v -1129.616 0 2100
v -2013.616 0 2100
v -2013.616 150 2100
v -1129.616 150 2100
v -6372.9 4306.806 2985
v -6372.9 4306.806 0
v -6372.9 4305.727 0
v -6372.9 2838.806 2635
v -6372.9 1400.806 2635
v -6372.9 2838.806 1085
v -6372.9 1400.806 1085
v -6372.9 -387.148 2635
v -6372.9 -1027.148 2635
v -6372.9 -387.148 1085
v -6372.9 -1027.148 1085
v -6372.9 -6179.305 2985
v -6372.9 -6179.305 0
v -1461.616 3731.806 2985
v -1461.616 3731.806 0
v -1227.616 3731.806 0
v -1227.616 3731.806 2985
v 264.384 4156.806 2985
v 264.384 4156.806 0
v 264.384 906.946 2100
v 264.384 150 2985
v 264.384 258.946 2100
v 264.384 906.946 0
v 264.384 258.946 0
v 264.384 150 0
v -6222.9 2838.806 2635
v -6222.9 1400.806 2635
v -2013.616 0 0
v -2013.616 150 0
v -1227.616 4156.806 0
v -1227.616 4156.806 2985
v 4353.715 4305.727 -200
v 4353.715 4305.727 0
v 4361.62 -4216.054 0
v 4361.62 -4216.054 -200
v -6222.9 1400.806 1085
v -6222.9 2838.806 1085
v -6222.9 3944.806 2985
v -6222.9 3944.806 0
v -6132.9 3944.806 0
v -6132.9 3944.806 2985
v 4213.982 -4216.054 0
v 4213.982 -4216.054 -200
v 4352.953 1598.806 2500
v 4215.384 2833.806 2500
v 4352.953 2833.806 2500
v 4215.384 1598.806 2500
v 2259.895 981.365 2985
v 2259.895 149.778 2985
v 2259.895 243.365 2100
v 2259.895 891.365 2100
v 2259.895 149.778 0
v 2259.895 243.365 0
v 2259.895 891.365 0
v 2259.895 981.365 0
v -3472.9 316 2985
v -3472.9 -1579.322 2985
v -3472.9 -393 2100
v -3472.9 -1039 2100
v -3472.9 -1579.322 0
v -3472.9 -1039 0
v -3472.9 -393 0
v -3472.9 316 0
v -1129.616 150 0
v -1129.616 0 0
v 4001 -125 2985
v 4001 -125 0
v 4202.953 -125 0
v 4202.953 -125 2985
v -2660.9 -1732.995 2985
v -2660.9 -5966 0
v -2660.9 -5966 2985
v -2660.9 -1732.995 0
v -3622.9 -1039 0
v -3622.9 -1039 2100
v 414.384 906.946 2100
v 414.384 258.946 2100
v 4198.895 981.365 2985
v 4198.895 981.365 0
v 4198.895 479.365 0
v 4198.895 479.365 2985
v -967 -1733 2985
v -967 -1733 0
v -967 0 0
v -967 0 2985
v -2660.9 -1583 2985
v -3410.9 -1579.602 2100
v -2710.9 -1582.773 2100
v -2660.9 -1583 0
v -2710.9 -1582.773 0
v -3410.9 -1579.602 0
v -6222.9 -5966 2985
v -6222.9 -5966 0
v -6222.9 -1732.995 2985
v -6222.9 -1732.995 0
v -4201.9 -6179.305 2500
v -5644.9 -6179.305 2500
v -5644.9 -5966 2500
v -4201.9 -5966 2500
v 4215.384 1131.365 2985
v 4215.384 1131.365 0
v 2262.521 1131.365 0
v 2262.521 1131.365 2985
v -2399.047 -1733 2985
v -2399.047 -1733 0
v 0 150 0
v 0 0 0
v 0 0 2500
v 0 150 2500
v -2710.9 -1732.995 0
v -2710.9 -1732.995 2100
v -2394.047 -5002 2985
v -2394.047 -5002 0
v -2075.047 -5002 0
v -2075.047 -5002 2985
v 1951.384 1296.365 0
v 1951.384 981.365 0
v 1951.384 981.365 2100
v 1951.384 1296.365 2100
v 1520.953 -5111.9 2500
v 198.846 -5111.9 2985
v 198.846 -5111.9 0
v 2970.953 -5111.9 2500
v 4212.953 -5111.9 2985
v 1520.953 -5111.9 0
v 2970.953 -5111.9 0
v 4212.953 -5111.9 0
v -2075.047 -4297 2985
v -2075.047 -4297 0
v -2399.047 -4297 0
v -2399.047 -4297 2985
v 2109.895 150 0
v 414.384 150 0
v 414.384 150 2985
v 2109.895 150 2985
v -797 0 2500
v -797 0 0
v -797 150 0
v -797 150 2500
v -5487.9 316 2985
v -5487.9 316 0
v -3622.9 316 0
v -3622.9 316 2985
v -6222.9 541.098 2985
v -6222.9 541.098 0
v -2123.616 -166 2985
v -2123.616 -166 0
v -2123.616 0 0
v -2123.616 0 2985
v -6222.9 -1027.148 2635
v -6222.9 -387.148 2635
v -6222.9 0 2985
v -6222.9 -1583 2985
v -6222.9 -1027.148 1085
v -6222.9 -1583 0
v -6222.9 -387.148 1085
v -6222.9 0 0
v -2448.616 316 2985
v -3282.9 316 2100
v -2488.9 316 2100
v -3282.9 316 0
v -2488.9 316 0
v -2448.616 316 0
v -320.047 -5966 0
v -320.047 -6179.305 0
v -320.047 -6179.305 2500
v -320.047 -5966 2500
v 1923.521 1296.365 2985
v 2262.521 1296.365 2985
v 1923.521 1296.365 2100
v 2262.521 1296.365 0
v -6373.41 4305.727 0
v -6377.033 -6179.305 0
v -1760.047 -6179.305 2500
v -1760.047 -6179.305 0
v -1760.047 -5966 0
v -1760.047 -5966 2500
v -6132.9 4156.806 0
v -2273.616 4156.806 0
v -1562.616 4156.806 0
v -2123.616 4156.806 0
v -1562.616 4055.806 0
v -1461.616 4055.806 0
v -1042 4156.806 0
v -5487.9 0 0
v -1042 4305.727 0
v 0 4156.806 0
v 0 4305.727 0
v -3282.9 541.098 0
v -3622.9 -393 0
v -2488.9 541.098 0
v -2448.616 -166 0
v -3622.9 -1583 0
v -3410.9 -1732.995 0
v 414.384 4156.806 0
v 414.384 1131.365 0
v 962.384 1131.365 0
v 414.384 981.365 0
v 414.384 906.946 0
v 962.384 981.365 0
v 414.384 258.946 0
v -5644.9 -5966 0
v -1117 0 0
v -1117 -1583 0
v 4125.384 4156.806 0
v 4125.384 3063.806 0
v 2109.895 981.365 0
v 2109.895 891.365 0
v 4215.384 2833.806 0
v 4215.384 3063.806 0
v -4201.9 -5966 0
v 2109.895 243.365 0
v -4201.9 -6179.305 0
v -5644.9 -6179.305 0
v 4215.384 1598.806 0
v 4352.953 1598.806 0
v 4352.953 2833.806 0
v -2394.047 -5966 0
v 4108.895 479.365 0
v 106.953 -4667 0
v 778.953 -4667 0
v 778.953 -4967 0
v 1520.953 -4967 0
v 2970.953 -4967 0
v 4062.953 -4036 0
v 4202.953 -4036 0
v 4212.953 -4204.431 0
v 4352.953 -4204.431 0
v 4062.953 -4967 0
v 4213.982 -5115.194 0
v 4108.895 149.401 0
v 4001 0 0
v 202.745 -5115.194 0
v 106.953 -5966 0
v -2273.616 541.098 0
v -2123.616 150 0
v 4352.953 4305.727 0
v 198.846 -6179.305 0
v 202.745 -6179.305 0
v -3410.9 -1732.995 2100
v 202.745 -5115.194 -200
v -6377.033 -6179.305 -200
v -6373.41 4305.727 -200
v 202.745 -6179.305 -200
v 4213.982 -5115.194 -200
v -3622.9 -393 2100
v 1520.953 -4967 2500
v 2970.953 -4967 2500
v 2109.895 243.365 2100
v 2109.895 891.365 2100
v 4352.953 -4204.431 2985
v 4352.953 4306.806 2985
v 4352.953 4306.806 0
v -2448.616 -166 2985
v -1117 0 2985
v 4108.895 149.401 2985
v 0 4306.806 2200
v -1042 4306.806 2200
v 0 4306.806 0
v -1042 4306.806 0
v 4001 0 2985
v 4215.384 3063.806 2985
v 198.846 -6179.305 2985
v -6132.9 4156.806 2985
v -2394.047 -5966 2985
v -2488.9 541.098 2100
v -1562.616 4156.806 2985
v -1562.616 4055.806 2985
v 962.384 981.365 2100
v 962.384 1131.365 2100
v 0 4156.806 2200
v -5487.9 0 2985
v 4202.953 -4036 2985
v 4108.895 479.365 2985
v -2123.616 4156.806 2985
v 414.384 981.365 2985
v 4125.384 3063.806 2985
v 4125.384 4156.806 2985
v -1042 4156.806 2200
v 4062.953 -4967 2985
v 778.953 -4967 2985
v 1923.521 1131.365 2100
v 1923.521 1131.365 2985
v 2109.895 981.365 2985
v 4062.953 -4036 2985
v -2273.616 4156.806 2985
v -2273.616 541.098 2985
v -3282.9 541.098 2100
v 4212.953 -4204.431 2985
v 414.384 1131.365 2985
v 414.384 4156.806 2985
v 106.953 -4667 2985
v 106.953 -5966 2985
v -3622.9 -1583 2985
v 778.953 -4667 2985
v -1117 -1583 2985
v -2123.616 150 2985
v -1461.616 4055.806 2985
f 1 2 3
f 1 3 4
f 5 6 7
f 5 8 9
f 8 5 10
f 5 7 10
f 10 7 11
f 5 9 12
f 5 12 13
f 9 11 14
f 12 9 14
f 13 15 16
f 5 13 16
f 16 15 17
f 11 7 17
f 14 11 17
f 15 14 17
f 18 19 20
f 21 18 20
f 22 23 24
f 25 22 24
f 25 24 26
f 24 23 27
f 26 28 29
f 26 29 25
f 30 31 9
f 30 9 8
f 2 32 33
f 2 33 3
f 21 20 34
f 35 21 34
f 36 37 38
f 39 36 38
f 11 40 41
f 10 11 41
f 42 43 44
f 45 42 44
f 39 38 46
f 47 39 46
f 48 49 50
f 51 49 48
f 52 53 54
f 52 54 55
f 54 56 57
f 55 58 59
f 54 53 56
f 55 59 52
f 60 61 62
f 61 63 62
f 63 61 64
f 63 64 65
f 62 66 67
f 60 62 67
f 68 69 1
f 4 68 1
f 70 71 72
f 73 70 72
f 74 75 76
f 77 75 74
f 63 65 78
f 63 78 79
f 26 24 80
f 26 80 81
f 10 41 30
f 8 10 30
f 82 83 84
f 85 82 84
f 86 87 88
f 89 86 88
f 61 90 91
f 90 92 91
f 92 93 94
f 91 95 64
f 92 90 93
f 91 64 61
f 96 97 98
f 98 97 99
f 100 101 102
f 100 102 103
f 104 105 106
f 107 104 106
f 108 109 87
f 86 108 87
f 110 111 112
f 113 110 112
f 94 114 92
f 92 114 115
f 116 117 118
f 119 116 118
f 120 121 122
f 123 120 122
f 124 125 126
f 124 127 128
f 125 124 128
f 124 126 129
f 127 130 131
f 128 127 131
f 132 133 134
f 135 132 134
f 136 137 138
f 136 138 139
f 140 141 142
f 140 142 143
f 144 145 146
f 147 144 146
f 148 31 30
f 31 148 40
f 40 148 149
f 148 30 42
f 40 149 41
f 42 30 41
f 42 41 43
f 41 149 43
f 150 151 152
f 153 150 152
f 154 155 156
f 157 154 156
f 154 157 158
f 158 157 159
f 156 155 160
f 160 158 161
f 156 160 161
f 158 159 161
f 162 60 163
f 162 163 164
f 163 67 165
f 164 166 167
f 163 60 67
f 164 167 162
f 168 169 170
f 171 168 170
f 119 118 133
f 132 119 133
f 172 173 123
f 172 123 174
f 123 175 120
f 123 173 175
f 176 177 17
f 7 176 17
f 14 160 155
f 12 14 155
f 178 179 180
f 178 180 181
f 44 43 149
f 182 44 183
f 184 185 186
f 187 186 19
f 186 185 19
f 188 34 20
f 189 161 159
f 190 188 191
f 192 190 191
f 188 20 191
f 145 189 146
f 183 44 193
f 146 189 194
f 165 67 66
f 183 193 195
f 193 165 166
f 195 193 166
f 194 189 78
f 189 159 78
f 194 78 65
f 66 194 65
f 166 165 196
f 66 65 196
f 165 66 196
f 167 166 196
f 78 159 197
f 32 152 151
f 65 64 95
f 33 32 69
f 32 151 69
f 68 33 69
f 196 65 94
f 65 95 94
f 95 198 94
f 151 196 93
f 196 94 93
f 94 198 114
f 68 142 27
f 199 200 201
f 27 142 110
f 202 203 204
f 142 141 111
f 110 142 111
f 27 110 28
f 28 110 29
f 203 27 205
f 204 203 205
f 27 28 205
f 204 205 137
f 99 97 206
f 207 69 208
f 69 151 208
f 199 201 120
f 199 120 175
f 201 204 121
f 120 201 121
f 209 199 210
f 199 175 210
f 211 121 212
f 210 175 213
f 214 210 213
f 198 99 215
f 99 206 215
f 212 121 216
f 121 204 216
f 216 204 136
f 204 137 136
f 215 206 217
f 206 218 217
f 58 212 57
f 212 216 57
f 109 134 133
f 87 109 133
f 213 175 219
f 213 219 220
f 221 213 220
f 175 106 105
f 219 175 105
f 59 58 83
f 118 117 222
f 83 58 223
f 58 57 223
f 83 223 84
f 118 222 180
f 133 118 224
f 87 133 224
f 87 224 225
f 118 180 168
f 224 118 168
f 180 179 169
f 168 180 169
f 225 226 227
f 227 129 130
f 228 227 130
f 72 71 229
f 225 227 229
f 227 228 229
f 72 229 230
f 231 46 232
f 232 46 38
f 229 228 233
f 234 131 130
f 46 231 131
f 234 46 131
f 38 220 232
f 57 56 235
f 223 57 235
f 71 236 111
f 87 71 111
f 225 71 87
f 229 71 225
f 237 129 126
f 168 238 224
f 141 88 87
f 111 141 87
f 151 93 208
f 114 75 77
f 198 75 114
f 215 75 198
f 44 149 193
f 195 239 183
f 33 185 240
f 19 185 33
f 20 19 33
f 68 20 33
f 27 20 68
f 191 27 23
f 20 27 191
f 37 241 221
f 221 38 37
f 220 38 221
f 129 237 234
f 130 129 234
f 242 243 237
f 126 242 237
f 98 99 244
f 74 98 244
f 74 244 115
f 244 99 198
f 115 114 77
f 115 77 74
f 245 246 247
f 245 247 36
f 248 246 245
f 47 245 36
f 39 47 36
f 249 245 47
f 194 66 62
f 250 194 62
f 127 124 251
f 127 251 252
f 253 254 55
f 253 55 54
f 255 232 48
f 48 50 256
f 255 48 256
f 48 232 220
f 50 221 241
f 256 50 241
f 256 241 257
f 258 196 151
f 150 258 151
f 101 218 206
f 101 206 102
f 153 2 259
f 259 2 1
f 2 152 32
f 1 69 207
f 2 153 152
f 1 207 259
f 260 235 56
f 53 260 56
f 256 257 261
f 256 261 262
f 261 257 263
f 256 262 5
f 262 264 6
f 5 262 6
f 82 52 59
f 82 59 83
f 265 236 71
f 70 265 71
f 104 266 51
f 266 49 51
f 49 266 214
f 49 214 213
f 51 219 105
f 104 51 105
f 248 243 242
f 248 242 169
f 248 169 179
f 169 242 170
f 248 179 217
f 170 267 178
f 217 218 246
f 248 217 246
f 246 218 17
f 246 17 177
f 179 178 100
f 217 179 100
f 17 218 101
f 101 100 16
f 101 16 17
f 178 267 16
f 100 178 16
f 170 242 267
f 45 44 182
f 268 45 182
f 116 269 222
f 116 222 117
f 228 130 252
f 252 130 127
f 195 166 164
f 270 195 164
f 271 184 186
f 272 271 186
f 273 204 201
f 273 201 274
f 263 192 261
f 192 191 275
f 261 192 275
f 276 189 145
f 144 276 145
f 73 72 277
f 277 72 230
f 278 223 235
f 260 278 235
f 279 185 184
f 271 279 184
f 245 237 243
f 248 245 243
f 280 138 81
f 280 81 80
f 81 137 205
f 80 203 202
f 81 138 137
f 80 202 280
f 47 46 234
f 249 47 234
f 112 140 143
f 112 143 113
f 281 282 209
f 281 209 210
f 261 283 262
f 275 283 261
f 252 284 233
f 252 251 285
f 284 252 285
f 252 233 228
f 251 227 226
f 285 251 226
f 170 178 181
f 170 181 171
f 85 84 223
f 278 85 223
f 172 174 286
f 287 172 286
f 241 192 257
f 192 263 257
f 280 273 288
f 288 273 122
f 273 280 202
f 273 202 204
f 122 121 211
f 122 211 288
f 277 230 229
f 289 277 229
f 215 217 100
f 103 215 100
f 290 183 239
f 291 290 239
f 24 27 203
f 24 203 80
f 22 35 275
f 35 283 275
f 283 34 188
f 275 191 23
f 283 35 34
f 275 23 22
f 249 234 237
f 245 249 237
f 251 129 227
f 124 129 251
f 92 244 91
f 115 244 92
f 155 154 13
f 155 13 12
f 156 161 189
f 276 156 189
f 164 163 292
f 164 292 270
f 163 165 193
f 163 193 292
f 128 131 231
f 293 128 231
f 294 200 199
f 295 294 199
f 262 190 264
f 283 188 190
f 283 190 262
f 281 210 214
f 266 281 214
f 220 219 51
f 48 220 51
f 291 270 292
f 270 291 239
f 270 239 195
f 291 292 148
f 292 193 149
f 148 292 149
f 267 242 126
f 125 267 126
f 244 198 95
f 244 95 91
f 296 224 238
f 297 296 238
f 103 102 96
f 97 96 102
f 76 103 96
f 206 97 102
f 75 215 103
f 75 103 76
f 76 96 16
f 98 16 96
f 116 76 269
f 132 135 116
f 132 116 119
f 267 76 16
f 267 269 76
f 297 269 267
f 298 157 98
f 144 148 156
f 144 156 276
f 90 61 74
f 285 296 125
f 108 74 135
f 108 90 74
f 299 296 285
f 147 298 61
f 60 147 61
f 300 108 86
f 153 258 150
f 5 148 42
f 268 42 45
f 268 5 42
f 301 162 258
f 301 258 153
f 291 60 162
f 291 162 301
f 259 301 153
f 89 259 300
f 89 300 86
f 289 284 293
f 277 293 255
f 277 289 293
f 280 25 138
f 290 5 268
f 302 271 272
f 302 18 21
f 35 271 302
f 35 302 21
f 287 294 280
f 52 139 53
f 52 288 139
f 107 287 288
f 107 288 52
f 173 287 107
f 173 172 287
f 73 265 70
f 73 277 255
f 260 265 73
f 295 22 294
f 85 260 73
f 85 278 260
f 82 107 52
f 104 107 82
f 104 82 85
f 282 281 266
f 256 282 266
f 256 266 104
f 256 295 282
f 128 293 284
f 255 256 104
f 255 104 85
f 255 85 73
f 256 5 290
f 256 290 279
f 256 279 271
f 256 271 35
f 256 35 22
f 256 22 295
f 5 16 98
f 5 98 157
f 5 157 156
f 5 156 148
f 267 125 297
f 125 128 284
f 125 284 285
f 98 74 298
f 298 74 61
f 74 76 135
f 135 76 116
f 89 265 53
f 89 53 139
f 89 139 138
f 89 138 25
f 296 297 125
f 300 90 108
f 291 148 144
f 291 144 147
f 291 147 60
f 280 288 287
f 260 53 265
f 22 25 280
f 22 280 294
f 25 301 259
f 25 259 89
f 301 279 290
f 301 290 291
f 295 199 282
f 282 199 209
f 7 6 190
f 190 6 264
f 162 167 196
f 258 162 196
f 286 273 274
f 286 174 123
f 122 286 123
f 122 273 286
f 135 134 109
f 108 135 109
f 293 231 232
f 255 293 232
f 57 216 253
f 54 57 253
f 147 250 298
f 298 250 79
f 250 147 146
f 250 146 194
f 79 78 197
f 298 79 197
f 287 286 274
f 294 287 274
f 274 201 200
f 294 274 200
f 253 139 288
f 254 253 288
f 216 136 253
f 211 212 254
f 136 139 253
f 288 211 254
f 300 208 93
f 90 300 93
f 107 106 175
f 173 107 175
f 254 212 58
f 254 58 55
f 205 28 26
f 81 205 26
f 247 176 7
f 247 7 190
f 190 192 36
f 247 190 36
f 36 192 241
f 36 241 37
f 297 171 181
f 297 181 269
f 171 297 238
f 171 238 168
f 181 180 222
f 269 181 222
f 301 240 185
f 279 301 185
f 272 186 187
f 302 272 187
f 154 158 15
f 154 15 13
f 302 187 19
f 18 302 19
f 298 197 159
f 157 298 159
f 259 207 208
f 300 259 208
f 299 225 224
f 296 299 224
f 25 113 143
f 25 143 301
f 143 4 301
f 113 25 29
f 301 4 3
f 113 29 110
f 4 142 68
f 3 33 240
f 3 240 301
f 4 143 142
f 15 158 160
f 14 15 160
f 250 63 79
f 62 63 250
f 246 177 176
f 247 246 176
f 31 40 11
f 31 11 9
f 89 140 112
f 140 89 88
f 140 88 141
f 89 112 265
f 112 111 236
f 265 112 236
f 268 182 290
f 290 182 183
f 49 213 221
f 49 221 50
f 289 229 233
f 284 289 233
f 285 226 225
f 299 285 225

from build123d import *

# Parameters (mm, degrees)
F0_W      = 3562
F0_H      = 4233.004609108
F0_W_2    = 1695.5107385512
F0_H_2    = 831.3654631398
F1_DEPTH  = 2985
F2_W      = 1450
F2_H      = 2500
F3_DEPTH  = 144.9
F4_W      = 1440
F4_H      = 2500
F5_DEPTH  = 213.304599762
F6_W      = 1443
F6_H      = 2500
F7_DEPTH  = 213.304599762
F8_W      = 797
F8_H      = 2500
F9_DEPTH  = 150
F10_W     = 989
F10_H     = 2100
F11_DEPTH = 315.001
F12_W     = 648
F12_H     = 2100
F13_DEPTH = 150
F14_W     = 648
F14_H     = 2100
F15_DEPTH = 150
F16_W     = 1042
F16_H     = 2200
F17_DEPTH = 150
F18_W     = 1235
F18_H     = 2500
F19_DEPTH = 137.5694923401
F20_W     = 700
F20_H     = 2100
F21_DEPTH = 153.3939067339
F22_W     = 794
F22_H     = 2100
F23_DEPTH = 225.0975813866
F24_W     = 884
F24_H     = 2100
F25_DEPTH = 150
F26_W     = 646
F26_H     = 2100
F27_DEPTH = 150
F28_W     = 640
F28_H     = 1550
F29_DEPTH = 150
F30_W     = 1438
F30_H     = 1550
F31_DEPTH = 150
F33_DEPTH = 200


with BuildPart() as f1:
    # F0 (on Top) → F1 (new body)
    with BuildSketch(Plane.XY):
        Polygon((1409, -5111.9), (2800.470790863, -5111.9), (4212.9532585144, -5111.9), (4212.9532585144, -4204.4310569763), (4352.9532585144, -4204.4310569763), (4352.9532585144, 4306.8055872194), (-2273.6162338257, 4306.8055872194), (-6372.8999999957, 4306.8055872194), (-6372.8999999957, 541.0975813866), (-6372.8999999957, -6179.304599762), (-2660.8999999957, -6179.304599762), (-1872.0002385101, -6179.304599762), (-435.1912385101, -6179.304599762), (198.84583354, -6179.304599762), (198.84583354, -5111.9), (720.84583354, -5111.9), (1350.470790863, -5111.9), align=None)
        with Locations((-4441.8999999957, -3849.497695446)):
            Rectangle(F0_W, F0_H, mode=Mode.SUBTRACT)
        Polygon((-797, 0), (0, 0), (4001, 0), (4001, -125), (4202.9532585144, -125), (4202.9532585144, -4036), (4062.9532585144, -4036), (4062.9532585144, -4967), (2970.9532585144, -4967), (1520.9532585144, -4967), (778.9532585144, -4967), (778.9532585144, -4667), (106.9532585144, -4667), (106.9532585144, -5966), (-320.0467414856, -5966), (-1760.0467414856, -5966), (-2394.0467414856, -5966), (-2394.0467414856, -5002), (-2075.0467414856, -5002), (-2075.0467414856, -4297), (-2399.0467414856, -4297), (-2399.0467414856, -4291.9), (-2399.0467414856, -1733), (-967, -1733), (-967, 0), align=None, mode=Mode.SUBTRACT)
        Polygon((-5487.8999999957, 316), (-3622.8999999957, 316), (-3622.8999999957, -1583), (-6222.8999999957, -1583), (-6222.8999999957, 0), (-5487.8999999957, 0), align=None, mode=Mode.SUBTRACT)
        Polygon((-1117, -1583), (-2660.8999999957, -1583), (-3472.8999999957, -1579.3216228485), (-3472.8999999957, 316), (-2448.6162338257, 316), (-2448.6162338257, -166), (-2123.6162338257, -166), (-2123.6162338257, 0), (-1117, 0), align=None, mode=Mode.SUBTRACT)
        Polygon((-6132.8999999957, 4156.8055872194), (-2273.6162338257, 4156.8055872194), (-2273.6162338257, 541.0975813866), (-3622.8999999957, 541.0975813866), (-6222.8999999957, 541.0975813866), (-6222.8999999957, 3944.8055872194), (-6132.8999999957, 3944.8055872194), align=None, mode=Mode.SUBTRACT)
        with Locations((1262.1391354499, 565.6827315699)):
            Rectangle(F0_W_2, F0_H_2, mode=Mode.SUBTRACT)
        Polygon((4198.8945047255, 981.3654631398), (4198.8945047255, 479.3654631398), (4108.8945047255, 479.3654631398), (4108.8945047255, 149.4008999277), (2259.8945047255, 149.7780185152), (2259.8945047255, 150), (2259.8945047255, 981.3654631398), align=None, mode=Mode.SUBTRACT)
        Polygon((264.3837661743, 150), (0.0004012527, 150), (-1117, 150), (-2123.6162338257, 150), (-2123.6162338257, 4156.8055872194), (-1562.6162338257, 4156.8055872194), (-1562.6162338257, 4055.8055872194), (-1461.6162338257, 4055.8055872194), (-1461.6162338257, 3731.8055872194), (-1227.6162338257, 3731.8055872194), (-1227.6162338257, 4156.8055872194), (264.3837661743, 4156.8055872194), align=None, mode=Mode.SUBTRACT)
        Polygon((4215.3837661743, 1131.3654631398), (2262.5213682051, 1131.3654631398), (2262.5213682051, 1296.3654631398), (1923.5213682051, 1296.3654631398), (1923.5213682051, 1131.3654631398), (414.3837661743, 1131.3654631398), (414.3837661743, 4156.8055872194), (4125.3837661743, 4156.8055872194), (4125.3837661743, 3063.8055872194), (4215.3837661743, 3063.8055872194), align=None, mode=Mode.SUBTRACT)
    extrude(amount=F1_DEPTH)

    # F2 (on face) → F3 (cut, through all)
    with BuildSketch(Plane.XZ.offset(5111.9)):
        with Locations((2245.9532585144, 1250)):
            Rectangle(F2_W, F2_H)
    extrude(amount=-F3_DEPTH, mode=Mode.SUBTRACT)

    # F4 (on face) → F5 (cut, through all)
    with BuildSketch(Plane.XZ.offset(6179.304599762)):
        with Locations((-1040.0467414856, 1250)):
            Rectangle(F4_W, F4_H)
    extrude(amount=-F5_DEPTH, mode=Mode.SUBTRACT)

    # F6 (on face) → F7 (cut, through all)
    with BuildSketch(Plane.XZ.offset(6179.304599762)):
        with Locations((-4923.3999999957, 1250)):
            Rectangle(F6_W, F6_H)
    extrude(amount=-F7_DEPTH, mode=Mode.SUBTRACT)

    # F8 (on face) → F9 (cut, through all)
    with BuildSketch(Plane.XZ):
        with Locations((-398.5, 1250)):
            Rectangle(F8_W, F8_H)
    extrude(amount=-F9_DEPTH, mode=Mode.SUBTRACT)

    # F10 (on face) → F11 (cut, through all)
    with BuildSketch(Plane.XZ.offset(-981.3654631398)):
        with Locations((1456.8837661743, 1050)):
            Rectangle(F10_W, F10_H)
    extrude(amount=-F11_DEPTH, mode=Mode.SUBTRACT)

    # F12 (on face) → F13 (cut, through all)
    with BuildSketch(Plane(origin=(264.3837661743, 0, 0), x_dir=(0, -1, 0), z_dir=(-1, 0, 0))):
        with Locations((-582.9456732107, 1050)):
            Rectangle(F12_W, F12_H)
    extrude(amount=-F13_DEPTH, mode=Mode.SUBTRACT)

    # F14 (on face) → F15 (cut, through all)
    with BuildSketch(Plane(origin=(2109.8945047255, 0, 0), x_dir=(0, -1, 0), z_dir=(-1, 0, 0))):
        with Locations((-567.3654631398, 1050)):
            Rectangle(F14_W, F14_H)
    extrude(amount=-F15_DEPTH, mode=Mode.SUBTRACT)

    # F16 (on face) → F17 (cut, through all)
    with BuildSketch(Plane.XZ.offset(-4156.8055872194)):
        with Locations((-521, 1100)):
            Rectangle(F16_W, F16_H)
    extrude(amount=-F17_DEPTH, mode=Mode.SUBTRACT)

    # F18 (on face) → F19 (cut, through all)
    with BuildSketch(Plane(origin=(4215.3837661743, 0, 0), x_dir=(0, -1, 0), z_dir=(-1, 0, 0))):
        with Locations((-2216.3055872194, 1250)):
            Rectangle(F18_W, F18_H)
    extrude(amount=-F19_DEPTH, mode=Mode.SUBTRACT)

    # F20 (on face) → F21 (cut, through all)
    with BuildSketch(Plane.XZ.offset(1732.995390892)):
        with Locations((-3060.8999999957, 1050)):
            Rectangle(F20_W, F20_H)
    extrude(amount=-F21_DEPTH, mode=Mode.SUBTRACT)

    # F22 (on face) → F23 (cut, through all)
    with BuildSketch(Plane.XZ.offset(-316)):
        with Locations((-2885.8999999957, 1050)):
            Rectangle(F22_W, F22_H)
    extrude(amount=-F23_DEPTH, mode=Mode.SUBTRACT)

    # F24 (on face) → F25 (cut, through all)
    with BuildSketch(Plane.XZ):
        with Locations((-1571.6162338257, 1050)):
            Rectangle(F24_W, F24_H)
    extrude(amount=-F25_DEPTH, mode=Mode.SUBTRACT)

    # F26 (on face) → F27 (cut, through all)
    with BuildSketch(Plane.YZ.offset(-3472.8999999957)):
        with Locations((-716, 1050)):
            Rectangle(F26_W, F26_H)
    extrude(amount=-F27_DEPTH, mode=Mode.SUBTRACT)

    # F28 (on face) → F29 (cut, through all)
    with BuildSketch(Plane.YZ.offset(-6222.8999999957)):
        with Locations((-707.1478068829, 1860)):
            Rectangle(F28_W, F28_H)
    extrude(amount=-F29_DEPTH, mode=Mode.SUBTRACT)

    # F30 (on face) → F31 (cut, through all)
    with BuildSketch(Plane.YZ.offset(-6222.8999999957)):
        with Locations((2119.8055872194, 1860)):
            Rectangle(F30_W, F30_H)
    extrude(amount=-F31_DEPTH, mode=Mode.SUBTRACT)

    # F32 (on face) → F33 (join)
    with BuildSketch(Plane(origin=(0, 0, 0), x_dir=(1, 0, 0), z_dir=(0, 0, -1))):
        Polygon((202.7448713779, 6179.304599762), (-6377.0327568054, 6179.304599762), (-6373.4097480774, -4305.7265281677), (4353.7154197693, -4305.7265281677), (4361.6199493408, 4216.0544395447), (4213.9821052551, 4216.0544395447), (4213.9821052551, 5115.1938438416), (202.7448713779, 5115.1938438416), align=None)
    extrude(amount=F33_DEPTH)


solid = f1.part
